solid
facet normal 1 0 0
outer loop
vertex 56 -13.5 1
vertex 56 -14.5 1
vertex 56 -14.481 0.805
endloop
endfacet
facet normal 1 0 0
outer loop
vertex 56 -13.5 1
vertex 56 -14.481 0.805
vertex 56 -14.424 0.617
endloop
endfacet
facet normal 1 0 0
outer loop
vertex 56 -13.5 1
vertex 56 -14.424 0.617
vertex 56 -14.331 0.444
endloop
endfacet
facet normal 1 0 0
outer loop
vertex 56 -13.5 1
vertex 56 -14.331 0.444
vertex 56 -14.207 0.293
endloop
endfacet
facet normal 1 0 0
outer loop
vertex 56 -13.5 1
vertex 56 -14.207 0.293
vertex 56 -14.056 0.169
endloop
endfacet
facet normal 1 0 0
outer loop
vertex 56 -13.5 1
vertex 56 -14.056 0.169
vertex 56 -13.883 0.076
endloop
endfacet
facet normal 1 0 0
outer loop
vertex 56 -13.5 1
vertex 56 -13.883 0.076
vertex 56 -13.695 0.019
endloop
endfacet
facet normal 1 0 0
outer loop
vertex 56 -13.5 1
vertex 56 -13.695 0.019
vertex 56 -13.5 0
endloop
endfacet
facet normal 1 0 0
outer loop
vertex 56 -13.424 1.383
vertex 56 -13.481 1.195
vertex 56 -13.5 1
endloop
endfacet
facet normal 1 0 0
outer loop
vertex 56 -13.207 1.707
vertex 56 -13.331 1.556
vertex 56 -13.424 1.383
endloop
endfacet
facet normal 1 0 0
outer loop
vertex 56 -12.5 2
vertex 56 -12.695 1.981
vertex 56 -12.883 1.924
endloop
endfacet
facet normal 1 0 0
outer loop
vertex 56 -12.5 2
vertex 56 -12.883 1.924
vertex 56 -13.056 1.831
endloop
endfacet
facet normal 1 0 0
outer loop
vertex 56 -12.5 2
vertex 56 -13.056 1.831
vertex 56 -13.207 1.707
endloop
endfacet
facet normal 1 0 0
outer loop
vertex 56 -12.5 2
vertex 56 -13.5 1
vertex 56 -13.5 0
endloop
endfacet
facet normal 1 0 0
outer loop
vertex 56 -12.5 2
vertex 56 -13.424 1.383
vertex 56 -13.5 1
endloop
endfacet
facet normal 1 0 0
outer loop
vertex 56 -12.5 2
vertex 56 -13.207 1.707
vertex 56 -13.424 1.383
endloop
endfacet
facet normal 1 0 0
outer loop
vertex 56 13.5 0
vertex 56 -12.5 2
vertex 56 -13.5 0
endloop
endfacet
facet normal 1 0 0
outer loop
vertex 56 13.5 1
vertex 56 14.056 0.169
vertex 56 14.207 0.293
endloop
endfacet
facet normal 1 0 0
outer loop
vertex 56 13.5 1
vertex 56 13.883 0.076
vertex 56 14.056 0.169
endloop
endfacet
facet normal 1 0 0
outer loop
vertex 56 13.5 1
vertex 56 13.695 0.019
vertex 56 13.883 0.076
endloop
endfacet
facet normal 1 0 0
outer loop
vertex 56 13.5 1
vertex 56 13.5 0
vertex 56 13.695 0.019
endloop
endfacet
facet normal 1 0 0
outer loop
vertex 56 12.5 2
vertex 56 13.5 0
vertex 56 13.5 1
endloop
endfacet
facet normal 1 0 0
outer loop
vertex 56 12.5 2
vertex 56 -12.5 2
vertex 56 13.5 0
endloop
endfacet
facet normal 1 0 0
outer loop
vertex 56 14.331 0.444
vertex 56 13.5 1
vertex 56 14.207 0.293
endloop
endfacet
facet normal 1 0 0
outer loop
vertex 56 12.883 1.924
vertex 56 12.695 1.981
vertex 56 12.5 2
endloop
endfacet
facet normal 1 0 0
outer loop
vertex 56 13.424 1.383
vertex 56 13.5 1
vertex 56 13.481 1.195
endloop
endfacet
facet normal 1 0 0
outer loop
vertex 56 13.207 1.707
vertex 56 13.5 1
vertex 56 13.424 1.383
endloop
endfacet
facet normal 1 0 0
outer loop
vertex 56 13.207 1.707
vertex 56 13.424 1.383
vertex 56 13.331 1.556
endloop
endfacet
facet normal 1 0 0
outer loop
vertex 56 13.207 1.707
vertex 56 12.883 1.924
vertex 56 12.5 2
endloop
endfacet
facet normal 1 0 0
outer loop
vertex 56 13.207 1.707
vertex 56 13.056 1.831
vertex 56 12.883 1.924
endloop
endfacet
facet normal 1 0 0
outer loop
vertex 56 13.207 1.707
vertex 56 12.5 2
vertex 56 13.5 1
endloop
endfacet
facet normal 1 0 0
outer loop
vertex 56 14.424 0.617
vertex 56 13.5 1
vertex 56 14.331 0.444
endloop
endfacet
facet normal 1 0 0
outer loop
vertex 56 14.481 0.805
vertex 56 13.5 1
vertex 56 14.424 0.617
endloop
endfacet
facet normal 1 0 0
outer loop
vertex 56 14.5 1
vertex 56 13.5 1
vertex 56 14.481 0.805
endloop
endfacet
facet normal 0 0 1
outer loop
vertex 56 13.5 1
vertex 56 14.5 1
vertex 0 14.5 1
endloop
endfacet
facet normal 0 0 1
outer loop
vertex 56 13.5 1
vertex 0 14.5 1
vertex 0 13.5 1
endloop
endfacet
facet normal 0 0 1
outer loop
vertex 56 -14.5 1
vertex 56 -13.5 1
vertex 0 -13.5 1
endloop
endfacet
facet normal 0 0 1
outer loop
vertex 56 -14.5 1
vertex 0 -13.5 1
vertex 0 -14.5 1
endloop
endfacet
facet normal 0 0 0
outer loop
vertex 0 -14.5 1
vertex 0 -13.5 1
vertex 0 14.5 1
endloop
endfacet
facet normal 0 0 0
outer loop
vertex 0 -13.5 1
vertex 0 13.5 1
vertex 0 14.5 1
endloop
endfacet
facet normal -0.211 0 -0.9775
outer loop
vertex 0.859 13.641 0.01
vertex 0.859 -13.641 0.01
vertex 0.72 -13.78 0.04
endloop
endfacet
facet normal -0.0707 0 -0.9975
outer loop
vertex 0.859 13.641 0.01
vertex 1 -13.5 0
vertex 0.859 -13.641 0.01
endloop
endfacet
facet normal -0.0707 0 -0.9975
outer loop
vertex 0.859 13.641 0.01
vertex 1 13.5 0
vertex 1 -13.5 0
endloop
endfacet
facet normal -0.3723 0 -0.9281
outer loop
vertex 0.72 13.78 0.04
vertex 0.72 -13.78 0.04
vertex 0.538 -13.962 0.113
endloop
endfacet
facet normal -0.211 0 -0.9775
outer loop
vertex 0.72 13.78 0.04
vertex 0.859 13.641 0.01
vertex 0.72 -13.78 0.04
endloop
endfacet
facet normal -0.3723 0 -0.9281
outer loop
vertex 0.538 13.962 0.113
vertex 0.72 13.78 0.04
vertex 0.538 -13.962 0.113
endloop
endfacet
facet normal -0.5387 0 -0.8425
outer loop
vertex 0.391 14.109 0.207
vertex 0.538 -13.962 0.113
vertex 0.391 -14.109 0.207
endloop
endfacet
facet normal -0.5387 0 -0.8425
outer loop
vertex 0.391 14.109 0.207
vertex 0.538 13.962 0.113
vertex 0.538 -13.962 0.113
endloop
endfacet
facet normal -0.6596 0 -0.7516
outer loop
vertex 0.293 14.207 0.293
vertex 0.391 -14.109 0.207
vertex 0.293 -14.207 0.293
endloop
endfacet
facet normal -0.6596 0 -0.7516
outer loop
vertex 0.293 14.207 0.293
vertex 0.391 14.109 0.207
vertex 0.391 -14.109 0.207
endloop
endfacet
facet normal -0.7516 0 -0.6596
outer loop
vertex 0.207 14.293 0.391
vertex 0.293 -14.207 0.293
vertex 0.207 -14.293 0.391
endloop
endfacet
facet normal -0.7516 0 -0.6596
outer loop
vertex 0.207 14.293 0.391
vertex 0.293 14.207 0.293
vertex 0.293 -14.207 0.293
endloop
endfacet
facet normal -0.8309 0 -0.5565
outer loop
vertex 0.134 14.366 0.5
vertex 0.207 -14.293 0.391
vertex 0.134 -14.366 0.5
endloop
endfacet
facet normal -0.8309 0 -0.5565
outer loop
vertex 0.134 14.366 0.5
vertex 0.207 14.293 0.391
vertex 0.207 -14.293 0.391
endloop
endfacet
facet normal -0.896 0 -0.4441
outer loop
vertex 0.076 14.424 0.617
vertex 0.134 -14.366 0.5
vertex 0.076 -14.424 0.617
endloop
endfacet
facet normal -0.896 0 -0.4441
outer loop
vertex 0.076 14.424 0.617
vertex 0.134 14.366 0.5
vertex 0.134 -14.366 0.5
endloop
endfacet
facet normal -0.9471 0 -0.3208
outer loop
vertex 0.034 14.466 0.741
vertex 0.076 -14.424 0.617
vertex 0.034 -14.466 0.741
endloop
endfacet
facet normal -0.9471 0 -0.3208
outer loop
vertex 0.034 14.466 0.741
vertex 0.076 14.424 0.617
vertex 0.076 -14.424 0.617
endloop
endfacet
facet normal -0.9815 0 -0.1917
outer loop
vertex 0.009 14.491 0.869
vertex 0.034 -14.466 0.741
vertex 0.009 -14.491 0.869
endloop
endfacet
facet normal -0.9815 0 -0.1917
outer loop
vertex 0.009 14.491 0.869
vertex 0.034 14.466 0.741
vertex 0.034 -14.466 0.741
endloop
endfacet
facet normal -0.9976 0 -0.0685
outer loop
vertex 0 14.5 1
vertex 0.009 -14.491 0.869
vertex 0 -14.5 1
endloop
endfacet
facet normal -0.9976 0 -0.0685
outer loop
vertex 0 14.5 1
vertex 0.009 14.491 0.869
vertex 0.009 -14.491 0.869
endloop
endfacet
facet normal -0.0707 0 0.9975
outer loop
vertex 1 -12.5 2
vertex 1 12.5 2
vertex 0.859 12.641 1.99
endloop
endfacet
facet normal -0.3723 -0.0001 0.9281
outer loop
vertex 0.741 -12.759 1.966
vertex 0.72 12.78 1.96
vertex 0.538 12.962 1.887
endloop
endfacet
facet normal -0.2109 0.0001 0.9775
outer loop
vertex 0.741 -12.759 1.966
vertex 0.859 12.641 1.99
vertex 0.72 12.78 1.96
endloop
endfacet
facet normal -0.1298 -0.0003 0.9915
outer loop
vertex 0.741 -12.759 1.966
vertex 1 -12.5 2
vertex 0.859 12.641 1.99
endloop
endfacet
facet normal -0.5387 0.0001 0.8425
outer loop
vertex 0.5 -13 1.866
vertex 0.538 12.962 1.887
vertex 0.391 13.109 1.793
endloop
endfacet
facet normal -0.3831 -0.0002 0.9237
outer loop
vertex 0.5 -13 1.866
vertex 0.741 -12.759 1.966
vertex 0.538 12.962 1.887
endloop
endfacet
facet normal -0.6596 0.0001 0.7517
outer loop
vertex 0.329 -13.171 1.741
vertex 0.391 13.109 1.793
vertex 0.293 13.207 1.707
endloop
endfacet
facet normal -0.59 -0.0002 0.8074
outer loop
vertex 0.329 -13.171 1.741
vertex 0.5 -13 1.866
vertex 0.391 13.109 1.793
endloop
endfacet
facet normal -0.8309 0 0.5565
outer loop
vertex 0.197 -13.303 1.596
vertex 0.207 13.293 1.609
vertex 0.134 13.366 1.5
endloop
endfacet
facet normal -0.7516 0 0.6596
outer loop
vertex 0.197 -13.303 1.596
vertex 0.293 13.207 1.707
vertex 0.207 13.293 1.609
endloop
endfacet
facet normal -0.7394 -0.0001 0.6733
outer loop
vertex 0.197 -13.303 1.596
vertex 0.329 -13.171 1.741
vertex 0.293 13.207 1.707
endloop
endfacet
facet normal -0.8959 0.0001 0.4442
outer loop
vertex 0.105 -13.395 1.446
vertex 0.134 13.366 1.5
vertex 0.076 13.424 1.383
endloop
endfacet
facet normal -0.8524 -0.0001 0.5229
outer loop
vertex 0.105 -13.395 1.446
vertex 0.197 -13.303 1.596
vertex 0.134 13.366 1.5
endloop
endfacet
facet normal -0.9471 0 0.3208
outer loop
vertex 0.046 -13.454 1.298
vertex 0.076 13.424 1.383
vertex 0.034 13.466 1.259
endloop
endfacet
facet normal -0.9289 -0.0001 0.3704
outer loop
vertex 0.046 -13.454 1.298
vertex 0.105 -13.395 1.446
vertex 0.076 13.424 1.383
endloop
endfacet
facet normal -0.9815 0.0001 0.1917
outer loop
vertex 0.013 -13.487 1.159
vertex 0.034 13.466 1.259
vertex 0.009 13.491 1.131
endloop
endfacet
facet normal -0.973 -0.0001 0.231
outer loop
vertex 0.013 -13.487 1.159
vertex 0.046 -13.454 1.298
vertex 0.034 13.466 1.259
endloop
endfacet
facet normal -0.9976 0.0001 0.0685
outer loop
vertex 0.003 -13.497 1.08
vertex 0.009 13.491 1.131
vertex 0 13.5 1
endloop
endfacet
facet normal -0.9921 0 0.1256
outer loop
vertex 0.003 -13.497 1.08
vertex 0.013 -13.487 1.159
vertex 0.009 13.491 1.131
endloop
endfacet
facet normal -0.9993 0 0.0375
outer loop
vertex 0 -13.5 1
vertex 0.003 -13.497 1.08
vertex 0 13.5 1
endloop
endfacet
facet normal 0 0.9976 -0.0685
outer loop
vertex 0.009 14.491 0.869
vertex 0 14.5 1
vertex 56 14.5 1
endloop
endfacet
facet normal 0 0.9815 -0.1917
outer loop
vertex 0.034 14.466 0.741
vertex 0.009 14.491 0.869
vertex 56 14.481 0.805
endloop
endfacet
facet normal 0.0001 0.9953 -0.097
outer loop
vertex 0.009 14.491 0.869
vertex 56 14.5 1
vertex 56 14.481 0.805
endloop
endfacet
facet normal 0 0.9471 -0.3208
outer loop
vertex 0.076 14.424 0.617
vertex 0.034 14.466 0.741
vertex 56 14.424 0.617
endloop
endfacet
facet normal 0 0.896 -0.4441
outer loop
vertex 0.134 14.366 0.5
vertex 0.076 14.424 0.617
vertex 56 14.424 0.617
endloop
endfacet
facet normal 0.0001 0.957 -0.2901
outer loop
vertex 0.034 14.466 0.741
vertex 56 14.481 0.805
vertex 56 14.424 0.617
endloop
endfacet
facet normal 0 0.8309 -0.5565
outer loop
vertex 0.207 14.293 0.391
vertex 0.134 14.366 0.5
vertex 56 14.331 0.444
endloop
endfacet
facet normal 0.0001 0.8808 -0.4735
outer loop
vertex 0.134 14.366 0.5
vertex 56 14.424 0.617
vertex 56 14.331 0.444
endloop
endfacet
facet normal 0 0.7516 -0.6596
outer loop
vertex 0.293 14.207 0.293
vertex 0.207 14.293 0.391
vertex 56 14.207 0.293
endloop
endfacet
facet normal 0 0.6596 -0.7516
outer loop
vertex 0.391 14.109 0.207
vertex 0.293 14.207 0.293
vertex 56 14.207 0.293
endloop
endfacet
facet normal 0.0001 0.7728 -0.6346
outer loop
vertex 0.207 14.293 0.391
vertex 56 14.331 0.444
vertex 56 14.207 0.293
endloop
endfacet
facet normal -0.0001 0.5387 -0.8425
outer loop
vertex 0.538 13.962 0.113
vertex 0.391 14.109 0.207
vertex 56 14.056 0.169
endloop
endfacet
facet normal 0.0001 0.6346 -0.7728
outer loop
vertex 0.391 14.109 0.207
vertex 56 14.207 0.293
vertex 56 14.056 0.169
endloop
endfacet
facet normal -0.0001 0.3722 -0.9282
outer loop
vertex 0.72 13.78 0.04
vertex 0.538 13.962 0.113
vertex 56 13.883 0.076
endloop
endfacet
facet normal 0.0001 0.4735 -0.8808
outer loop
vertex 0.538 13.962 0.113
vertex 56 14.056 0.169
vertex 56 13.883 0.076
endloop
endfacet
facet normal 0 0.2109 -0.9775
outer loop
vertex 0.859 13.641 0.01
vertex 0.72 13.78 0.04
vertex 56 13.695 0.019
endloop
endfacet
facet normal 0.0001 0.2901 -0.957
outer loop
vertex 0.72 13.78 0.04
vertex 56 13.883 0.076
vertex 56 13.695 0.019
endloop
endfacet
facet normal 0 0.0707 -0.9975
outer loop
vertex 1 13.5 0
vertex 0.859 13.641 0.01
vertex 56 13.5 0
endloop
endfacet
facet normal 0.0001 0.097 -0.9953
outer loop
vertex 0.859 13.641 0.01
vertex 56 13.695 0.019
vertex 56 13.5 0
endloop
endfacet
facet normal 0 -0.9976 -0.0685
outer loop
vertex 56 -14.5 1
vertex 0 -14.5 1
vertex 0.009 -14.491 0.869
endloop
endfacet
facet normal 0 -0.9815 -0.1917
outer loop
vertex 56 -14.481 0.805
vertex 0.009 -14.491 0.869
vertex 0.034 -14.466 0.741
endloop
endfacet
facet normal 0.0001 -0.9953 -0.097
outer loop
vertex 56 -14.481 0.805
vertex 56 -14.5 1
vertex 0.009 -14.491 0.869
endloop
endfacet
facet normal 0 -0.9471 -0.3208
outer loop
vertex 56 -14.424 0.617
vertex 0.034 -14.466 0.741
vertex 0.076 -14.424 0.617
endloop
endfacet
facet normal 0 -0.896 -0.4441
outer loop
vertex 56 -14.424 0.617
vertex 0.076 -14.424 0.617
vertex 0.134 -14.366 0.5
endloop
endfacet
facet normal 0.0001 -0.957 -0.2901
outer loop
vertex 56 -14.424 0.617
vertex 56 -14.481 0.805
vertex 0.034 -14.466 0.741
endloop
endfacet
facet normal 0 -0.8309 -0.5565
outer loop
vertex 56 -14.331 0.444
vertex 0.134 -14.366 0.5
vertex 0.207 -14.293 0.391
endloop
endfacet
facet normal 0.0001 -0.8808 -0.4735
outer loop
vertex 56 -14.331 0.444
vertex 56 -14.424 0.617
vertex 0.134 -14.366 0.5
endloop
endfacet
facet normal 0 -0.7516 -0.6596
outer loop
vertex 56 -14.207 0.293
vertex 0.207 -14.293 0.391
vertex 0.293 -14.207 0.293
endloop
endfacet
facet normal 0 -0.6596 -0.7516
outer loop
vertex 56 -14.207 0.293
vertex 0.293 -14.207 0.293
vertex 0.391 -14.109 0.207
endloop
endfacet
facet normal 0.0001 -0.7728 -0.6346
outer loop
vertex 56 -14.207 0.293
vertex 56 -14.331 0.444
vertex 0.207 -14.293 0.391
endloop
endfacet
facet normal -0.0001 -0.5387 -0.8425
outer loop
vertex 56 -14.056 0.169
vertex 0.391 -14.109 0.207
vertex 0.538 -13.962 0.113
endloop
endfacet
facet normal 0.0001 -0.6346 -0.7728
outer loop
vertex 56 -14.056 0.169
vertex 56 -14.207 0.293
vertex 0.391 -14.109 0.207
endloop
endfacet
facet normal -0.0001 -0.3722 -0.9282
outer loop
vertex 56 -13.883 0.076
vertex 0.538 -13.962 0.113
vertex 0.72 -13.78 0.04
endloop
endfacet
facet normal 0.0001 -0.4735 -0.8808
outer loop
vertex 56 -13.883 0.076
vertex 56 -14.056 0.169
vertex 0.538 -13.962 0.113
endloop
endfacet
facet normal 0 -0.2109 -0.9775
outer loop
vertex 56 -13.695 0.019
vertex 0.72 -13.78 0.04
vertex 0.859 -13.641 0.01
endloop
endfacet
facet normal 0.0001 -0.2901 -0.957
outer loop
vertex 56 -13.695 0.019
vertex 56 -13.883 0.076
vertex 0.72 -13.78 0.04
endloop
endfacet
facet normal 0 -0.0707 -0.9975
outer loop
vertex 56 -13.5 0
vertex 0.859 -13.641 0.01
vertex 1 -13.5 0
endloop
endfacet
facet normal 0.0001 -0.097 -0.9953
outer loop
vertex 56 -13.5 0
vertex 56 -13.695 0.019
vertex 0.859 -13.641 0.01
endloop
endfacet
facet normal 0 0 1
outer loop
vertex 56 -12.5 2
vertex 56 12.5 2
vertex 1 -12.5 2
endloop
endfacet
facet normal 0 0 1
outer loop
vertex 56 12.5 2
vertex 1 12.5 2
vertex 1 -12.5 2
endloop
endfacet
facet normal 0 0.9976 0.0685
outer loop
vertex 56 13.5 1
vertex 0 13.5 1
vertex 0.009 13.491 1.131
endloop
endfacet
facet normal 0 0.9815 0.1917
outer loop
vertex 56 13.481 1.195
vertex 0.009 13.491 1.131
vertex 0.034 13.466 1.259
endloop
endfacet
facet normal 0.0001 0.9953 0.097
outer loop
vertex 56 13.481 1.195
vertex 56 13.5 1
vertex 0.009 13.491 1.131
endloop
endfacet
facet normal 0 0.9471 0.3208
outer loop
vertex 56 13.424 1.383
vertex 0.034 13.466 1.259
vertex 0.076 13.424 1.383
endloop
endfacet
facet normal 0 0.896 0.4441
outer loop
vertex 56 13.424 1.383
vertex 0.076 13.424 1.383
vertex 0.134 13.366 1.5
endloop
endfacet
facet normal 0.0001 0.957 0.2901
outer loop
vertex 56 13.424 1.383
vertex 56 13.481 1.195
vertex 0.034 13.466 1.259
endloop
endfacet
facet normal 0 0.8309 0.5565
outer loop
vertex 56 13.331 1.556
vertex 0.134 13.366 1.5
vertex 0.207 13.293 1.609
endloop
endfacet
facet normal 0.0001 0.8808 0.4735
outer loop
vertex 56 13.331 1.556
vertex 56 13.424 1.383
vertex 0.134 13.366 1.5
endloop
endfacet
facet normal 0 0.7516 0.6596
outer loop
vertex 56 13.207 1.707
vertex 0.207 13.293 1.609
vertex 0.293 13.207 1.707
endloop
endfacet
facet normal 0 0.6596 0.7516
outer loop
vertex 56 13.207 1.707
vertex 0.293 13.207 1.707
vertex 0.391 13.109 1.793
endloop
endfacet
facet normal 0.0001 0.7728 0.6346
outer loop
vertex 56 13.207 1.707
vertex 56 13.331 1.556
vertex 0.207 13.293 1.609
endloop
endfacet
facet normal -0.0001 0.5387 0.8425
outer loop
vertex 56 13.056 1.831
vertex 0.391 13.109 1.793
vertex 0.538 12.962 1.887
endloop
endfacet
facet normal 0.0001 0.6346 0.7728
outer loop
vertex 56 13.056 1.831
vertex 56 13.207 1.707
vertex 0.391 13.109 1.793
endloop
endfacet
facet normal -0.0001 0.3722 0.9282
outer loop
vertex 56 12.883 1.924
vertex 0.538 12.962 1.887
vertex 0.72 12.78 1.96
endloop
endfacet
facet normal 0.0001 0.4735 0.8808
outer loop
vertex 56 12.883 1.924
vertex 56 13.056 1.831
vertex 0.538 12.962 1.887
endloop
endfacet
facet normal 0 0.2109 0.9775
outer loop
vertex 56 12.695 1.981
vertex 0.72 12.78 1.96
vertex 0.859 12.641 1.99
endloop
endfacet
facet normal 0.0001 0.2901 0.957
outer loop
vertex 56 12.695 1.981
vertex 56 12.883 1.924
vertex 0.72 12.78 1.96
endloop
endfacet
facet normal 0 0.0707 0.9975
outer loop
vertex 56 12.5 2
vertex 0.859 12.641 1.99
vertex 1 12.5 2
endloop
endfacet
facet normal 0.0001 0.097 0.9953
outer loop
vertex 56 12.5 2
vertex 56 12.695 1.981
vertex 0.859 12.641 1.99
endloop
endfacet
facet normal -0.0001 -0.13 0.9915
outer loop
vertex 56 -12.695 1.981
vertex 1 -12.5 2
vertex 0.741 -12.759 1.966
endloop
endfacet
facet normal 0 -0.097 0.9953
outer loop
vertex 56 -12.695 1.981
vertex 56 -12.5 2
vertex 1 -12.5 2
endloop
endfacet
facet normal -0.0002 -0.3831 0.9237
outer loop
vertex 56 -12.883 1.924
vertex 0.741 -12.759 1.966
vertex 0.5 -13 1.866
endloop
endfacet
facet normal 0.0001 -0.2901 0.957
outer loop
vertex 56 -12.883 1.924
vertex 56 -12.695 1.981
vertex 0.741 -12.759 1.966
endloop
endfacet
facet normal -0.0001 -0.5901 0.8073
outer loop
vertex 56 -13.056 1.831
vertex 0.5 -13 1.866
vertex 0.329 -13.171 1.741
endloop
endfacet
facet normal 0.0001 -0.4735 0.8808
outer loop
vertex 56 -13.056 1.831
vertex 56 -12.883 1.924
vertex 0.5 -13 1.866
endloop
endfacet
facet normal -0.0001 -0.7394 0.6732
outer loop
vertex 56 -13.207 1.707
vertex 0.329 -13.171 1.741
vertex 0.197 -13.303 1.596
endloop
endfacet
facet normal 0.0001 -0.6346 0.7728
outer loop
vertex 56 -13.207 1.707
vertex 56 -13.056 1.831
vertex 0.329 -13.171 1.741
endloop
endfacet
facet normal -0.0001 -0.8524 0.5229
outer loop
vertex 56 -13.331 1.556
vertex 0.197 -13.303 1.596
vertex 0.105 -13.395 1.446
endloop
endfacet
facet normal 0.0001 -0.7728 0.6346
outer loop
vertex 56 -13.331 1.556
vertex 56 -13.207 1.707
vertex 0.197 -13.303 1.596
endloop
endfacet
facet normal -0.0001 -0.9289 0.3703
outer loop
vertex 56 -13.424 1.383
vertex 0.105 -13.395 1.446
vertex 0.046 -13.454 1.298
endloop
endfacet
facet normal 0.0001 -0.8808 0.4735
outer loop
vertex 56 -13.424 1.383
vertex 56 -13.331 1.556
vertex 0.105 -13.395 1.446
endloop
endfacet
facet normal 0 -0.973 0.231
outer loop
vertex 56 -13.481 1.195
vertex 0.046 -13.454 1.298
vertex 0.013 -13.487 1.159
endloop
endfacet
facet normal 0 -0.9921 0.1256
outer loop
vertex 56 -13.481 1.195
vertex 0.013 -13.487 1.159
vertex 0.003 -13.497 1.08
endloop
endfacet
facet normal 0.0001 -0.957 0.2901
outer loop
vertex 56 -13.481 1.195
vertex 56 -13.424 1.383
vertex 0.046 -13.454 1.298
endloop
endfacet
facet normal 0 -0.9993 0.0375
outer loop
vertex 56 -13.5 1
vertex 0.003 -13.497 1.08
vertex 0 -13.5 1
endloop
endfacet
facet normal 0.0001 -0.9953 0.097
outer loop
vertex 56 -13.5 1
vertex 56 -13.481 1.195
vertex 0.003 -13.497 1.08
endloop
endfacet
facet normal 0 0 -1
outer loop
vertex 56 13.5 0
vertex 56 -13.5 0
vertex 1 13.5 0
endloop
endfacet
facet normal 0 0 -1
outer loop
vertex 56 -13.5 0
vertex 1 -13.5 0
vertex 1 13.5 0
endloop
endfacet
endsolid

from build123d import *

# Parameters (mm, degrees)
F1_DEPTH = 56
F2_R     = 0.99999


# Not quite as in the source:
# - a fillet or chamfer is up to 0.001 mm smaller than in the source, because OpenCascade refuses the exact size


with BuildPart() as f1:
    # F0 (on Right) → F1 (new body)
    with BuildSketch(Plane.YZ):
        Polygon((0, 0), (14.5, 0), (14.5, 1), (13.5, 1), (13.5, 2), (0, 2), (-6.25, 2), (-13.5, 2), (-13.5, 1), (-14.5, 1), (-14.5, 0), (-7.25, 0), align=None)
    extrude(amount=F1_DEPTH)

    # F2 (radius 1 in the source; OpenCascade refuses exactly that, so slightly less here)
    f2_edges = [f1.edges().sort_by_distance(p)[0] for p in [
        (28, 13.5, 2),
        (28, -13.5, 2),
        (28, 14.5, 0),
        (28, -14.5, 0),
        (0, 0, 2),
        (0, 0, 0),
    ]]
    fillet(f2_edges, radius=F2_R)


solid = f1.part
